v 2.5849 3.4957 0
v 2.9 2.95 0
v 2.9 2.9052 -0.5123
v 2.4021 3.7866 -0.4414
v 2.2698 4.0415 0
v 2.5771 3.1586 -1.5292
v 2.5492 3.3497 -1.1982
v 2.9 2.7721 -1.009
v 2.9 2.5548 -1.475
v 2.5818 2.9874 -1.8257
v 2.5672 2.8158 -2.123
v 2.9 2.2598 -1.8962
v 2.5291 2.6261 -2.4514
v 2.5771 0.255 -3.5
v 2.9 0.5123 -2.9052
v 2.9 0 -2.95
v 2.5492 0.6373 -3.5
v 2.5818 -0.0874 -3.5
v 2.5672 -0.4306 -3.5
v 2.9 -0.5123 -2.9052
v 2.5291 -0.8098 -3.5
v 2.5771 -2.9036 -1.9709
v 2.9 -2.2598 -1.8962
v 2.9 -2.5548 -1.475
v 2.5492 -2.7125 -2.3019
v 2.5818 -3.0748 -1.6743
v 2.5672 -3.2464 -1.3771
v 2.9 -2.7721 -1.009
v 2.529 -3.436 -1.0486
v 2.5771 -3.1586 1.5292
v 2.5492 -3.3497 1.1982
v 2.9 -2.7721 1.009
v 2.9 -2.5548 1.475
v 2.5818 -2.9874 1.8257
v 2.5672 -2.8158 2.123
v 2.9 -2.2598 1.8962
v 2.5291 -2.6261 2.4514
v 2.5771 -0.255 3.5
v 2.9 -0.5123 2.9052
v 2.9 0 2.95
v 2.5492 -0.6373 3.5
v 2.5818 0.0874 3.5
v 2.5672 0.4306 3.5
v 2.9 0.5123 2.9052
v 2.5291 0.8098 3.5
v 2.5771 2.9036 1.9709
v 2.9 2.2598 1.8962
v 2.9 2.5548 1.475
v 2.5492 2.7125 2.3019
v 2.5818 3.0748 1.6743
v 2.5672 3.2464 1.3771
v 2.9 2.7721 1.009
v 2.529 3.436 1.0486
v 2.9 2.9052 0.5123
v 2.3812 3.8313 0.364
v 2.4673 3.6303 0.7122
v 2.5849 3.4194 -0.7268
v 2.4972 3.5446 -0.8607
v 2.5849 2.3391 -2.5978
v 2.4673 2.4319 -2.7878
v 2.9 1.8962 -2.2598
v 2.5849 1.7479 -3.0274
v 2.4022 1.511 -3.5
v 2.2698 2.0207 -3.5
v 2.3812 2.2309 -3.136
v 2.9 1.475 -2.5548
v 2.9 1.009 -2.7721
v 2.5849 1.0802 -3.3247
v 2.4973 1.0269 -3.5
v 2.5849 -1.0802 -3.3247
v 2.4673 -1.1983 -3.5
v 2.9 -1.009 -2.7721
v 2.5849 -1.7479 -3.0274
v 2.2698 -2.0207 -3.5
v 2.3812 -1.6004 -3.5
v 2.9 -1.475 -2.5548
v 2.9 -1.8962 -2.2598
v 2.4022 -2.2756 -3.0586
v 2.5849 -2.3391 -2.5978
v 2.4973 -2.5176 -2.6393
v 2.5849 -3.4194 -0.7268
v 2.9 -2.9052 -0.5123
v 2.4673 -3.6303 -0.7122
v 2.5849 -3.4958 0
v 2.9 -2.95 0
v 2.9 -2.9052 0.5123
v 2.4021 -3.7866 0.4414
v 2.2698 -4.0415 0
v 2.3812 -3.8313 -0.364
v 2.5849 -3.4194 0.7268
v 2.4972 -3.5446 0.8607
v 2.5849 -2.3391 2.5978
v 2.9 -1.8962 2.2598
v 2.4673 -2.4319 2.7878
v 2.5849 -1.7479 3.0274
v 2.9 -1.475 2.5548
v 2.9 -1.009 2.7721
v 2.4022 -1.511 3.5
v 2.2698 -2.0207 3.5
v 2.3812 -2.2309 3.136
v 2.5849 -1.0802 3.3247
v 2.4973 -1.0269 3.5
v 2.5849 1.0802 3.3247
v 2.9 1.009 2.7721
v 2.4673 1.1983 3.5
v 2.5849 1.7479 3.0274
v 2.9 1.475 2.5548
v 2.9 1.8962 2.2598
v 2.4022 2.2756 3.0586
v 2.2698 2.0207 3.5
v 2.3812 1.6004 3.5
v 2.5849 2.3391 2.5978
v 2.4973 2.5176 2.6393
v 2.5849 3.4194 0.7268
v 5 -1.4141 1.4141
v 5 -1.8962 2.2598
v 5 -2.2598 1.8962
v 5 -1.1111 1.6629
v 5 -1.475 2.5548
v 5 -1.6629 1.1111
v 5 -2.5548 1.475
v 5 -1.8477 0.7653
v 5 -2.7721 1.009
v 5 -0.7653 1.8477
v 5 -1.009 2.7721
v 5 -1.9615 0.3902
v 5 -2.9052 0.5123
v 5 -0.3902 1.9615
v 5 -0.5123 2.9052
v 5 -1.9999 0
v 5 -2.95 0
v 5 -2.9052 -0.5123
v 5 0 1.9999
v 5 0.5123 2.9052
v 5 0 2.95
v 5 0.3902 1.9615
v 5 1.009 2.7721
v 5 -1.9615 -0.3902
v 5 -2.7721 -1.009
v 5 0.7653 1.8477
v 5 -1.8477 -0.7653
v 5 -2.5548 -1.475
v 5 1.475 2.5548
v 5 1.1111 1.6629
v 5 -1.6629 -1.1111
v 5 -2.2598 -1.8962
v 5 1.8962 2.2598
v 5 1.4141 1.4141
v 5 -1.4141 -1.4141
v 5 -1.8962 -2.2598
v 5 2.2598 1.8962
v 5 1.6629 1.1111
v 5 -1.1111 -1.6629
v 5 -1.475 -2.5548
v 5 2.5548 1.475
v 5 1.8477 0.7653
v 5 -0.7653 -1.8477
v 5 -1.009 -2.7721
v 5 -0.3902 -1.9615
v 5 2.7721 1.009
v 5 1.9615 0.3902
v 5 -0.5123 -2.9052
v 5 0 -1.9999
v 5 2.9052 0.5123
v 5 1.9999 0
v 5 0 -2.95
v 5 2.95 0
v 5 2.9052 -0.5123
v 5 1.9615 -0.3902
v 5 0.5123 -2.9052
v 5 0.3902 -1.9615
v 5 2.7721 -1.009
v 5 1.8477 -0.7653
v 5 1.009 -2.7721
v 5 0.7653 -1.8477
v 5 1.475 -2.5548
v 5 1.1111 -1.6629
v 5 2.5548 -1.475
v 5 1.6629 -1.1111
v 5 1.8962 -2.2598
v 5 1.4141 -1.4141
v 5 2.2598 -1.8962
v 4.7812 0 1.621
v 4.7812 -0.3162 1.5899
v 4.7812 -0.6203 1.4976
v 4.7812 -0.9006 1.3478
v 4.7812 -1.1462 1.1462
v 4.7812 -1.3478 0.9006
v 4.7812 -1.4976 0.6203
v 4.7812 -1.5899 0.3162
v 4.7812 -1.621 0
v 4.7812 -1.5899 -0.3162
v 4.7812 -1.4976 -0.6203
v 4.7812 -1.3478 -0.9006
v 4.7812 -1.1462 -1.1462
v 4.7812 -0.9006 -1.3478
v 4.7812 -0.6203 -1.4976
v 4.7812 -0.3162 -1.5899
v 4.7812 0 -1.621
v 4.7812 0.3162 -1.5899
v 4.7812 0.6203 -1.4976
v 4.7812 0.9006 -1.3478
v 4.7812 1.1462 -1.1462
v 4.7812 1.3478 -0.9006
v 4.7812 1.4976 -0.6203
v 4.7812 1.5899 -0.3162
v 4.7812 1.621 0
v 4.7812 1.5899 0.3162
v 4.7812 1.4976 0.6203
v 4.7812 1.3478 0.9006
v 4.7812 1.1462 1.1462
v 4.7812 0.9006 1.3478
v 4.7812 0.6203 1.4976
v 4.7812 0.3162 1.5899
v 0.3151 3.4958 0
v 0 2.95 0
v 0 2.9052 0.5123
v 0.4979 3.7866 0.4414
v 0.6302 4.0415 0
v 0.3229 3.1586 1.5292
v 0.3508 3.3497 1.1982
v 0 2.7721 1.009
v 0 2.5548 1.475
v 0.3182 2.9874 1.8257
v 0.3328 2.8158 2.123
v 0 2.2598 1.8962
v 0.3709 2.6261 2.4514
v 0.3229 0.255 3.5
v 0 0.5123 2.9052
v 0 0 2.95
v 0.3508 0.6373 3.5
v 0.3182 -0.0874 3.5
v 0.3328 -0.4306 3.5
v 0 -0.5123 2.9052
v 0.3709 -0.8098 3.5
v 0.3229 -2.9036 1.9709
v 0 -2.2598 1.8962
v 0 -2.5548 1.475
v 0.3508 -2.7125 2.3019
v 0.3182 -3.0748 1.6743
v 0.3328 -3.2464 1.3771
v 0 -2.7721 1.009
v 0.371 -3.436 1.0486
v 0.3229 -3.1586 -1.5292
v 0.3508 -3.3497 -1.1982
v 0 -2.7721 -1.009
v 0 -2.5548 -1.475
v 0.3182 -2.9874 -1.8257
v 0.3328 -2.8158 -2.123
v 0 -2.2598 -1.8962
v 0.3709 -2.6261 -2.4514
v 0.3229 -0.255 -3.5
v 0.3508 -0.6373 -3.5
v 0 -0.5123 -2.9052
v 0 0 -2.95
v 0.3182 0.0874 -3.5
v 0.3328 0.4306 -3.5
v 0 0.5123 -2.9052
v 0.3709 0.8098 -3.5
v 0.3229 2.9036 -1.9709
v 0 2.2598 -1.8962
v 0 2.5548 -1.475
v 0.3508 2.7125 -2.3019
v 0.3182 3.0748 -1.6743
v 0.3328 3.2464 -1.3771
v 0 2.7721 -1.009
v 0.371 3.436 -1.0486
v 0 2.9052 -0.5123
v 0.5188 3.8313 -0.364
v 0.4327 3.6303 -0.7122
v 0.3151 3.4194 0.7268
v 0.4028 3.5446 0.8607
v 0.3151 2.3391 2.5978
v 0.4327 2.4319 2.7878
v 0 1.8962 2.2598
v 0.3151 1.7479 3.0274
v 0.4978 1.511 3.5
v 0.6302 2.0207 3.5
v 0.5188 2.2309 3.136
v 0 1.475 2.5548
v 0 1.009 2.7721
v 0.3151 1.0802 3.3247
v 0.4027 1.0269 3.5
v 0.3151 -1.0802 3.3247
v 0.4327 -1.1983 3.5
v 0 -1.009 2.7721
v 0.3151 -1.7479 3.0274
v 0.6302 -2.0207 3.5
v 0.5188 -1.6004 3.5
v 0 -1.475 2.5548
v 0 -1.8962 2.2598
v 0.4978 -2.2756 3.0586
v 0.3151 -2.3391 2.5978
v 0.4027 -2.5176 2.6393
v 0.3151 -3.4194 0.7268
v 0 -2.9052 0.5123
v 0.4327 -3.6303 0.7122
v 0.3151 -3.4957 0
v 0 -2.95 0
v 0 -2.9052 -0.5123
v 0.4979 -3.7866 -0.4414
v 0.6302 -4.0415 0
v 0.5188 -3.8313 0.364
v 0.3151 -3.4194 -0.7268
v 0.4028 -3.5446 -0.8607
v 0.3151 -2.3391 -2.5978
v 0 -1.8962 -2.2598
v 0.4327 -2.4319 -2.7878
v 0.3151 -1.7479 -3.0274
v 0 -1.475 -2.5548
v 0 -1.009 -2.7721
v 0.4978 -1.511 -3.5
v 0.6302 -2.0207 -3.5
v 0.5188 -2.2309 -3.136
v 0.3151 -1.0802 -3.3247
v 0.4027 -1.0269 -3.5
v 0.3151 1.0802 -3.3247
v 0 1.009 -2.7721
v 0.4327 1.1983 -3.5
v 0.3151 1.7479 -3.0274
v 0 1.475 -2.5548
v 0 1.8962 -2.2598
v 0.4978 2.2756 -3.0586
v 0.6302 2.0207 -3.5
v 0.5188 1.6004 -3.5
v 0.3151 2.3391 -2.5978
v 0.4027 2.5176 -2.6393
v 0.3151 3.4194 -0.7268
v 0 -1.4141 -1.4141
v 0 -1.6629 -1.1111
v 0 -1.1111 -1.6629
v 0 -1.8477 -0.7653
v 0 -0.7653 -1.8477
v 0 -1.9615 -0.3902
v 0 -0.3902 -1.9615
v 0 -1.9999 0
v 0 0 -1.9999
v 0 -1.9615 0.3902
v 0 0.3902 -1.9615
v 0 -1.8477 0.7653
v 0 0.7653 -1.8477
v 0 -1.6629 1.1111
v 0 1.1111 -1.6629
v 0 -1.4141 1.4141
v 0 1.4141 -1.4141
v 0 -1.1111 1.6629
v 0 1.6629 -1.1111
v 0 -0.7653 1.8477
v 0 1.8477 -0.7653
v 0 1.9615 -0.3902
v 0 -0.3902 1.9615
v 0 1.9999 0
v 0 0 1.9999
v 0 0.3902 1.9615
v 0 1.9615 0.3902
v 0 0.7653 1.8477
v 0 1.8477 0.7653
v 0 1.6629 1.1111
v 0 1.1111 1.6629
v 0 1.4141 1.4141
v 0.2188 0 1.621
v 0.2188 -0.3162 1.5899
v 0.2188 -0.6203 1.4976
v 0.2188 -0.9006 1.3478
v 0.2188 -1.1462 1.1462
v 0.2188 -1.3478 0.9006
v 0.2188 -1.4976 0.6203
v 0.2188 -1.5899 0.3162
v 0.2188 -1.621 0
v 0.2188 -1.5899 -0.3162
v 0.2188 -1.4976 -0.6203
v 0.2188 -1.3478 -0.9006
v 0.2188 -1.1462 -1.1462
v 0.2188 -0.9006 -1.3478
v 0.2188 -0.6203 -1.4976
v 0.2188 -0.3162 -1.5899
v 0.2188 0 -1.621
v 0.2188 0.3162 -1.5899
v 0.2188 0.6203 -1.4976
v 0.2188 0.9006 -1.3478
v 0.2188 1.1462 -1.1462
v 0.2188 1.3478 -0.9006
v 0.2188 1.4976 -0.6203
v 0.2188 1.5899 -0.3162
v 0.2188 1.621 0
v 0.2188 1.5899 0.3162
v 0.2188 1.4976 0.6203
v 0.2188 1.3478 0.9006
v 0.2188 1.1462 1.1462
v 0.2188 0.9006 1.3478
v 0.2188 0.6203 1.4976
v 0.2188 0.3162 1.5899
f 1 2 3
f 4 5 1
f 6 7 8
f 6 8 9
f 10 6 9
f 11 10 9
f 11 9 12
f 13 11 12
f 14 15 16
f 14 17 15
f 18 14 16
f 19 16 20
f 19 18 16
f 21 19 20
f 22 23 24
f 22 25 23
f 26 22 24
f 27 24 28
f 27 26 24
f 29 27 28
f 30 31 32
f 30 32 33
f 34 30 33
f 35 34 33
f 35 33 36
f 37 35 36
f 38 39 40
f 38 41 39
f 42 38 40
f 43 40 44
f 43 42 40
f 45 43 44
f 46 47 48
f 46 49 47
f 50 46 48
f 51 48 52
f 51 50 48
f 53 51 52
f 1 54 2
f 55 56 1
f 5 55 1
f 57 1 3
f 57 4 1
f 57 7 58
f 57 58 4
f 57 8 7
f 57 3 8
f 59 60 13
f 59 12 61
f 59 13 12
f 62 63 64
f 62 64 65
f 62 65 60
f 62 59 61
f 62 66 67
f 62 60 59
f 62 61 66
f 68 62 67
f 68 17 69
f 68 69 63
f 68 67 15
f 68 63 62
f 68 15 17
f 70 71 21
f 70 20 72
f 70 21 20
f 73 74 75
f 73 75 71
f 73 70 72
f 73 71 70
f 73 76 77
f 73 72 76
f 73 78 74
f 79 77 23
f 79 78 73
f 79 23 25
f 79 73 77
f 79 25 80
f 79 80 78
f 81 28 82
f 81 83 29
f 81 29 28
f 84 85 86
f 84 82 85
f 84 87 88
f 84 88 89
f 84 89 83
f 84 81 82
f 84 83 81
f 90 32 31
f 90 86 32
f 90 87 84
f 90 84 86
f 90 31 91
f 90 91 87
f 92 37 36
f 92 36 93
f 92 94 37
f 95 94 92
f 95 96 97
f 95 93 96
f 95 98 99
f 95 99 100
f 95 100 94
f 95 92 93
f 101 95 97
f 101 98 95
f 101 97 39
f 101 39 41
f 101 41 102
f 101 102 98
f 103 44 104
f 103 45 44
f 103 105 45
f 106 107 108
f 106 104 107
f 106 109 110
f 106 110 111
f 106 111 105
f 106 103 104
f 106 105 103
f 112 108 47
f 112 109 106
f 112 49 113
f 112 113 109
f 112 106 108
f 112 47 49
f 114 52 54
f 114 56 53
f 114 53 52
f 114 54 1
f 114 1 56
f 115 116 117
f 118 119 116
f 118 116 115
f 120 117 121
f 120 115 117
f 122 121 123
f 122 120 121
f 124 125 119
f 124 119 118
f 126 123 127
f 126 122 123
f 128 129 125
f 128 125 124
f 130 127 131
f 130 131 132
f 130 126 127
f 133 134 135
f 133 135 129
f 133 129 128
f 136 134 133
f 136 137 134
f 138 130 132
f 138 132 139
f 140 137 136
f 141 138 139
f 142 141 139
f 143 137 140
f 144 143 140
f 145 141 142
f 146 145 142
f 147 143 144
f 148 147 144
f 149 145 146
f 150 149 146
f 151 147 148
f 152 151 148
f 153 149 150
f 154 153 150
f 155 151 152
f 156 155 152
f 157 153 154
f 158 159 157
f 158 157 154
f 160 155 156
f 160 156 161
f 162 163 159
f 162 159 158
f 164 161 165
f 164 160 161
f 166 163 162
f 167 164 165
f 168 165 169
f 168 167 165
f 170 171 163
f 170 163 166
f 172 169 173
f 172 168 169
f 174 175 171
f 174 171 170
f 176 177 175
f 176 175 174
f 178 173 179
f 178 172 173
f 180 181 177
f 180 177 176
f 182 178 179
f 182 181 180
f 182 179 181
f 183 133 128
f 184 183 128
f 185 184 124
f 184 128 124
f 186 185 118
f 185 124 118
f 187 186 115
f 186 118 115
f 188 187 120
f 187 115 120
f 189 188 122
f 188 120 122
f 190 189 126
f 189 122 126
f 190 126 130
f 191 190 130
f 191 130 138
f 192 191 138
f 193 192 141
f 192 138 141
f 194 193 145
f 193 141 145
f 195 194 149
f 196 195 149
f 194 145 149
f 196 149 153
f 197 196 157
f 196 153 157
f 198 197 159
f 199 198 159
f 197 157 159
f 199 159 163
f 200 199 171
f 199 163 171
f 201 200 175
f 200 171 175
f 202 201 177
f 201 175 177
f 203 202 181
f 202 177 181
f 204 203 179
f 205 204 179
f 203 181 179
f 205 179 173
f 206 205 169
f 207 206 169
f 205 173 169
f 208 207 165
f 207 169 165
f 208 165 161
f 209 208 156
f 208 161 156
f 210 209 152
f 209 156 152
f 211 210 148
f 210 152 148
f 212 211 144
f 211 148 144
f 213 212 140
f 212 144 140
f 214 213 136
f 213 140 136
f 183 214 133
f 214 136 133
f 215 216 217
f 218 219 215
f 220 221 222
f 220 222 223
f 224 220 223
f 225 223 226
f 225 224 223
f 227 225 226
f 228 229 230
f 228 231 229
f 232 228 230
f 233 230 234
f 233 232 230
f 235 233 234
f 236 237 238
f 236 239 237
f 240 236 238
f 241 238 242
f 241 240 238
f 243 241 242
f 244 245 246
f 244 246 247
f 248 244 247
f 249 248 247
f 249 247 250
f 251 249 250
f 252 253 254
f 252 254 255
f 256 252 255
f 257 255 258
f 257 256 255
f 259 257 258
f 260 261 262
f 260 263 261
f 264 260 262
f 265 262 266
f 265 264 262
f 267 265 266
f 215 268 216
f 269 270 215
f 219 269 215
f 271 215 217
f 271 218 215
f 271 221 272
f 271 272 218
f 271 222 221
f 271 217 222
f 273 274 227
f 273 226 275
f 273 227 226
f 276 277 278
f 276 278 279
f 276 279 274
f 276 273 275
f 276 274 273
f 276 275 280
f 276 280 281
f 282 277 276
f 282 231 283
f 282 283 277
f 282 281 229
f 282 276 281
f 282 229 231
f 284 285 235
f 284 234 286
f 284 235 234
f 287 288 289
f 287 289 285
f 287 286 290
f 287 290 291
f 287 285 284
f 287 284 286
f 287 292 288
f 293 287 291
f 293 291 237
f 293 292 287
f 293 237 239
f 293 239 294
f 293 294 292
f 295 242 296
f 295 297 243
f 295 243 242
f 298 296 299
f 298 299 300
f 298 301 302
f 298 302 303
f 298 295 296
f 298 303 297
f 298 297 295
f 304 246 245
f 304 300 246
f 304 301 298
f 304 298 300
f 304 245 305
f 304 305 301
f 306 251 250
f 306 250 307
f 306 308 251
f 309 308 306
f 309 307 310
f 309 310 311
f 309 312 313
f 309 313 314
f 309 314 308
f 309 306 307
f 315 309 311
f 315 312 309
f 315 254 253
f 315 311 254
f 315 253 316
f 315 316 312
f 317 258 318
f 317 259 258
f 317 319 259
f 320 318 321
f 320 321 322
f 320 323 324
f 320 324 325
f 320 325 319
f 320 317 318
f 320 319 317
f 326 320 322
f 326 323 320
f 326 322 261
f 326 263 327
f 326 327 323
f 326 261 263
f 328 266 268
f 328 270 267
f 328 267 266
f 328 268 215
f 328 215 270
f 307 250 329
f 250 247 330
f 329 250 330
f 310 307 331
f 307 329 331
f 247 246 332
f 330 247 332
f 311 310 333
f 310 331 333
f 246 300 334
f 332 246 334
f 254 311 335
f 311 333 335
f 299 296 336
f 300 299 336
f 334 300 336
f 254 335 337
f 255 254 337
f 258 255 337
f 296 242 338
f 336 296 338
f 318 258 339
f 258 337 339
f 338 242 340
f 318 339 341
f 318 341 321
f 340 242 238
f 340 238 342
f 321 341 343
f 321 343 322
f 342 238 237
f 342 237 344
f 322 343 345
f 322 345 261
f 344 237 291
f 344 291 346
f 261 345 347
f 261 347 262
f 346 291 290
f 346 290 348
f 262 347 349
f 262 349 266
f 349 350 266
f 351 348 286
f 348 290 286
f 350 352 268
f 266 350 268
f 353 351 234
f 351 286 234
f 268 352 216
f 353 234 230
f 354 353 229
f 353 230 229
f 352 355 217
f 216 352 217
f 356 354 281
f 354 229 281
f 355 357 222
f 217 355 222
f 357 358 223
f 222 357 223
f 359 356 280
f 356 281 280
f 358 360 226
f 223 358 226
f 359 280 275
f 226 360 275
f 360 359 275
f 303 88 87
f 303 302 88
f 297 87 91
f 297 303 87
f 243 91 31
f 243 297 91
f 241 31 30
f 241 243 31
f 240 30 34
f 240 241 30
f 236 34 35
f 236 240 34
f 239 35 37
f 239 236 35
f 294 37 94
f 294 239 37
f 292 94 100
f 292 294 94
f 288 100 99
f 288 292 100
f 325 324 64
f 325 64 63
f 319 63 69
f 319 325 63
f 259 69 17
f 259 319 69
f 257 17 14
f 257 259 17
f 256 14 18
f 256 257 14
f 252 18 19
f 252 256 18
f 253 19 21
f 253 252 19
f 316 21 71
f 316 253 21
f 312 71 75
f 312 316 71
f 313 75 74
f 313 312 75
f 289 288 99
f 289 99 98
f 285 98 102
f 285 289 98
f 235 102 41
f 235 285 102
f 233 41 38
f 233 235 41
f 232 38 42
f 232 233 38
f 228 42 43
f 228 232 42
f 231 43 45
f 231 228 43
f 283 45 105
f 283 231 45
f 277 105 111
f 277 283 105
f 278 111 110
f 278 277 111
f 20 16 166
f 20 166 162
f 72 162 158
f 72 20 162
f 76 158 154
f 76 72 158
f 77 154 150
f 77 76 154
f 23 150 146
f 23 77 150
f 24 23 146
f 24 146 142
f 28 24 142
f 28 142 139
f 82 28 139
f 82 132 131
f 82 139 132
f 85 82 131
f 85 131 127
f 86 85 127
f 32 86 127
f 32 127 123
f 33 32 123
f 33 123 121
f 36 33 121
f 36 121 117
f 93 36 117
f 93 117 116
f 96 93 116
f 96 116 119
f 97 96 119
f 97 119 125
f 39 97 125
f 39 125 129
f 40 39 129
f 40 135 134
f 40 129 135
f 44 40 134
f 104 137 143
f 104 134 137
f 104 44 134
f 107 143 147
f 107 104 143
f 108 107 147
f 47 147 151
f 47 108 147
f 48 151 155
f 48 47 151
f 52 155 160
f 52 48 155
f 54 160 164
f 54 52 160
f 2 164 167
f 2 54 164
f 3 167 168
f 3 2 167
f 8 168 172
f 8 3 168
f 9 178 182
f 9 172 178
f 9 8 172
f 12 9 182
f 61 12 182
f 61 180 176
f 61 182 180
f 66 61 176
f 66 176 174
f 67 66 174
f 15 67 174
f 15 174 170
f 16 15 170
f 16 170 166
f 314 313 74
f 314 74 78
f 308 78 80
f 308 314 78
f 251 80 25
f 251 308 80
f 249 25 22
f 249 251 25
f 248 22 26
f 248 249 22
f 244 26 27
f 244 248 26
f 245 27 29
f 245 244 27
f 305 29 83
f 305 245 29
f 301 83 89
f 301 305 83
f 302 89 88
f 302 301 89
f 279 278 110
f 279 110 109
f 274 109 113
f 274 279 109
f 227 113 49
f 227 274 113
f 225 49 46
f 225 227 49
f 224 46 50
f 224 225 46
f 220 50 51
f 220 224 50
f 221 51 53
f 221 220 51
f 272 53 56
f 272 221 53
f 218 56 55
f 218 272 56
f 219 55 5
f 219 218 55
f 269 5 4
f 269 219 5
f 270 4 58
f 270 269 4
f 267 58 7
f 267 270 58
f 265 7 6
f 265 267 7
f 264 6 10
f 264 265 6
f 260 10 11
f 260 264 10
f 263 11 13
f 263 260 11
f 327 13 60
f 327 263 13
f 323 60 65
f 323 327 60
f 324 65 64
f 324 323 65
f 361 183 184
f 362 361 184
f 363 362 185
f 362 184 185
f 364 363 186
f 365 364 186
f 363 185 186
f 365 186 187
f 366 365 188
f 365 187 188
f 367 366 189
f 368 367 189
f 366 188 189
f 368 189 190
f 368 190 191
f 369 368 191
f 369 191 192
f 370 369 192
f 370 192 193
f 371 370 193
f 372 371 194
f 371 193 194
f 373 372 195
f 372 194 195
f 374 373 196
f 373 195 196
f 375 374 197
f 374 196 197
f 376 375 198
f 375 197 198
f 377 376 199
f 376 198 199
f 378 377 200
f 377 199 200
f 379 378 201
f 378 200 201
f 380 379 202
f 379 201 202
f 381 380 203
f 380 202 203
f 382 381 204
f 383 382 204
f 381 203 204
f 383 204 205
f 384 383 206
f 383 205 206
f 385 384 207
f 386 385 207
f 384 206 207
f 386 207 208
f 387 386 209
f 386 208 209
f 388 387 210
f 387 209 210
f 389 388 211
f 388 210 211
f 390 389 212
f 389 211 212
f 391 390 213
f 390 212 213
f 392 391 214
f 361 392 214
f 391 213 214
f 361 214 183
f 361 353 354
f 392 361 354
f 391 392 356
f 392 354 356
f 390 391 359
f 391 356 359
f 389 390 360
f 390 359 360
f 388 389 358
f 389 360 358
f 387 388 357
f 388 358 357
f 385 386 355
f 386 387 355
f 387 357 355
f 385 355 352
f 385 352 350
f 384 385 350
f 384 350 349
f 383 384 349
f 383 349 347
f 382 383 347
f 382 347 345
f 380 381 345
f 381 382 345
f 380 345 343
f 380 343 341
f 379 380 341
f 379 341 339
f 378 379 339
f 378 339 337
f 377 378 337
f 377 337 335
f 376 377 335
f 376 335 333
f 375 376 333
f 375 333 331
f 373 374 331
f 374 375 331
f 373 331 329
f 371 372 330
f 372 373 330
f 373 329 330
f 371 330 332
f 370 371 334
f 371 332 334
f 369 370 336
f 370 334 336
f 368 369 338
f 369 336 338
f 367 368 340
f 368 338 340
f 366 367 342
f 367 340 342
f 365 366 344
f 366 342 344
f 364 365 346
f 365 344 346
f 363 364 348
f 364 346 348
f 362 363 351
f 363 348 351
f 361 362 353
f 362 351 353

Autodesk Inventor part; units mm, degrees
ref_plane "YZ Plane" through (0, 0, 0) normal (1, 0, 0) x (0, 1, 0)
ref_plane "XZ Plane" through (0, 0, 0) normal (0, 1, 0) x (-1, 0, 0)
sketch "Skizze1" plane through (0, 0, 0) normal (1, 0, 0) x (0, 1, 0)
  line L0 (2.0207, -3.5) -> (-2.0207, -3.5)
  line L1 (-2.0207, -3.5) -> (-4.0415, 0)
  line L2 (-4.0415, 0) -> (-2.0207, 3.5)
  line L3 (-2.0207, 3.5) -> (2.0207, 3.5)
  line L4 (2.0207, 3.5) -> (4.0415, 0)
  line L5 (4.0415, 0) -> (2.0207, -3.5)
  point P0 (0, 0)
  point P1 (0, 0)
  dimension "d0" = 8.0829
extrude "Körper" add sketch "Skizze1" along normal blind 2.9
sketch "Skizze2" plane through (2.9, 0, 0) normal (1, 0, 0) x (0, 0, -1)
  circle A0 centre (0, 0) radius 2.95
  dimension "d7" = 5.9
extrude "Ring" add sketch "Skizze2" along normal blind 2.1
sketch "Skizze3" plane through (0, 0, 0) normal (0, 0, 1) x (1, 0, 0)
  line L0 (0, 2.0207) -> (0, 4.0415) projected
  line L1 (0, 4.0415) -> (2.9, 4.0415) projected
  line L2 (2.9, 2.0207) -> (2.9, 4.0415) projected
  line L3 (-0.58, 0) -> (3.48, 0) projected
  line L4 (0, 2.95) -> (0.6302, 4.0415)
  line L5 (2.2698, 4.0415) -> (2.9, 2.95)
  dimension "d3" = 30
  dimension "d4" = 30
  dimension "d5" = 5.9
  dimension "d6" = 5.9
revolve "Fase1" cut sketch "Skizze3" angle 360 about axis through (-10, 0, 0) along (1, 0, 0)
sketch "Skizze4" plane through (0, 0, 0) normal (-1, 0, 0) x (0, 0, 1)
  line L0 (0, -5.658) -> (0, 5.658) projected
  line L1 (-4.9, 0) -> (4.9, 0) projected
  point P0 (0, 0)
hole "Gewinde" at (0, 0, 0) direction (1, 0, 0) diameter 3.242 end through all thread size "M4x0.7" class "6H" standard "ISO Metric profile"
chamfer "Fase2" distance 0.3789 angle 30 1 edges at (0, 0, -1.621) measured on face at (0, 2.4745, -0.3005)
chamfer "Fase3" distance 0.3789 angle 30 1 edges at (5, 0, -1.621) measured on face at (5, -0.3646, -2.4627)
ref_plane "Work Plane1" through (11.804, 0, 0) normal (0, 0, 1) x (-1, 0, 0)
equation "\"d0\" = 1.1547 * SW"
equation "\"d1\" = KOH1"
equation "\"d7\" = SD2"
equation "\"d8\" = KOH - KOH1"
equation "\"d3\" = ANG1"
equation "\"d4\" = ANG2"
equation "\"d5\" = SW0"
equation "\"d6\" = SW01"
equation "\"d10\" = -0.5 * GD1 + 0.5 * NND"
equation "\"d46\" = -0.5 * GD1 + 0.5 * NND"
equation "\"d12\" = -0.5 * GD1 + 0.5 * NND"
equation "\"d47\" = -0.5 * GD1 + 0.5 * NND"
equation "\"ANG1\" = 30deg"
equation "\"ANG2\" = 30deg"
equation "\"NND\" = 4"
equation "\"KOH1\" = 2.9"
equation "\"KOH\" = 5"
equation "\"SW\" = 7"
equation "\"SW0\" = 5.9"
equation "\"SW01\" = SW0"
equation "\"SD2\" = SW0"
equation "\"GUL\" = 0.541266 * PTC"
equation "\"THREADDIA\" = 4"
equation "\"TOA\" = 30deg"
equation "\"PTC\" = 0.7"
equation "\"GAL\" = 0.541266 * PTC"
equation "\"E0\" = 1.155 * SW"
equation "\"GD1\" = 3.242228"
properties part number "DIN 985 - M4" material "Stahl, weich"
